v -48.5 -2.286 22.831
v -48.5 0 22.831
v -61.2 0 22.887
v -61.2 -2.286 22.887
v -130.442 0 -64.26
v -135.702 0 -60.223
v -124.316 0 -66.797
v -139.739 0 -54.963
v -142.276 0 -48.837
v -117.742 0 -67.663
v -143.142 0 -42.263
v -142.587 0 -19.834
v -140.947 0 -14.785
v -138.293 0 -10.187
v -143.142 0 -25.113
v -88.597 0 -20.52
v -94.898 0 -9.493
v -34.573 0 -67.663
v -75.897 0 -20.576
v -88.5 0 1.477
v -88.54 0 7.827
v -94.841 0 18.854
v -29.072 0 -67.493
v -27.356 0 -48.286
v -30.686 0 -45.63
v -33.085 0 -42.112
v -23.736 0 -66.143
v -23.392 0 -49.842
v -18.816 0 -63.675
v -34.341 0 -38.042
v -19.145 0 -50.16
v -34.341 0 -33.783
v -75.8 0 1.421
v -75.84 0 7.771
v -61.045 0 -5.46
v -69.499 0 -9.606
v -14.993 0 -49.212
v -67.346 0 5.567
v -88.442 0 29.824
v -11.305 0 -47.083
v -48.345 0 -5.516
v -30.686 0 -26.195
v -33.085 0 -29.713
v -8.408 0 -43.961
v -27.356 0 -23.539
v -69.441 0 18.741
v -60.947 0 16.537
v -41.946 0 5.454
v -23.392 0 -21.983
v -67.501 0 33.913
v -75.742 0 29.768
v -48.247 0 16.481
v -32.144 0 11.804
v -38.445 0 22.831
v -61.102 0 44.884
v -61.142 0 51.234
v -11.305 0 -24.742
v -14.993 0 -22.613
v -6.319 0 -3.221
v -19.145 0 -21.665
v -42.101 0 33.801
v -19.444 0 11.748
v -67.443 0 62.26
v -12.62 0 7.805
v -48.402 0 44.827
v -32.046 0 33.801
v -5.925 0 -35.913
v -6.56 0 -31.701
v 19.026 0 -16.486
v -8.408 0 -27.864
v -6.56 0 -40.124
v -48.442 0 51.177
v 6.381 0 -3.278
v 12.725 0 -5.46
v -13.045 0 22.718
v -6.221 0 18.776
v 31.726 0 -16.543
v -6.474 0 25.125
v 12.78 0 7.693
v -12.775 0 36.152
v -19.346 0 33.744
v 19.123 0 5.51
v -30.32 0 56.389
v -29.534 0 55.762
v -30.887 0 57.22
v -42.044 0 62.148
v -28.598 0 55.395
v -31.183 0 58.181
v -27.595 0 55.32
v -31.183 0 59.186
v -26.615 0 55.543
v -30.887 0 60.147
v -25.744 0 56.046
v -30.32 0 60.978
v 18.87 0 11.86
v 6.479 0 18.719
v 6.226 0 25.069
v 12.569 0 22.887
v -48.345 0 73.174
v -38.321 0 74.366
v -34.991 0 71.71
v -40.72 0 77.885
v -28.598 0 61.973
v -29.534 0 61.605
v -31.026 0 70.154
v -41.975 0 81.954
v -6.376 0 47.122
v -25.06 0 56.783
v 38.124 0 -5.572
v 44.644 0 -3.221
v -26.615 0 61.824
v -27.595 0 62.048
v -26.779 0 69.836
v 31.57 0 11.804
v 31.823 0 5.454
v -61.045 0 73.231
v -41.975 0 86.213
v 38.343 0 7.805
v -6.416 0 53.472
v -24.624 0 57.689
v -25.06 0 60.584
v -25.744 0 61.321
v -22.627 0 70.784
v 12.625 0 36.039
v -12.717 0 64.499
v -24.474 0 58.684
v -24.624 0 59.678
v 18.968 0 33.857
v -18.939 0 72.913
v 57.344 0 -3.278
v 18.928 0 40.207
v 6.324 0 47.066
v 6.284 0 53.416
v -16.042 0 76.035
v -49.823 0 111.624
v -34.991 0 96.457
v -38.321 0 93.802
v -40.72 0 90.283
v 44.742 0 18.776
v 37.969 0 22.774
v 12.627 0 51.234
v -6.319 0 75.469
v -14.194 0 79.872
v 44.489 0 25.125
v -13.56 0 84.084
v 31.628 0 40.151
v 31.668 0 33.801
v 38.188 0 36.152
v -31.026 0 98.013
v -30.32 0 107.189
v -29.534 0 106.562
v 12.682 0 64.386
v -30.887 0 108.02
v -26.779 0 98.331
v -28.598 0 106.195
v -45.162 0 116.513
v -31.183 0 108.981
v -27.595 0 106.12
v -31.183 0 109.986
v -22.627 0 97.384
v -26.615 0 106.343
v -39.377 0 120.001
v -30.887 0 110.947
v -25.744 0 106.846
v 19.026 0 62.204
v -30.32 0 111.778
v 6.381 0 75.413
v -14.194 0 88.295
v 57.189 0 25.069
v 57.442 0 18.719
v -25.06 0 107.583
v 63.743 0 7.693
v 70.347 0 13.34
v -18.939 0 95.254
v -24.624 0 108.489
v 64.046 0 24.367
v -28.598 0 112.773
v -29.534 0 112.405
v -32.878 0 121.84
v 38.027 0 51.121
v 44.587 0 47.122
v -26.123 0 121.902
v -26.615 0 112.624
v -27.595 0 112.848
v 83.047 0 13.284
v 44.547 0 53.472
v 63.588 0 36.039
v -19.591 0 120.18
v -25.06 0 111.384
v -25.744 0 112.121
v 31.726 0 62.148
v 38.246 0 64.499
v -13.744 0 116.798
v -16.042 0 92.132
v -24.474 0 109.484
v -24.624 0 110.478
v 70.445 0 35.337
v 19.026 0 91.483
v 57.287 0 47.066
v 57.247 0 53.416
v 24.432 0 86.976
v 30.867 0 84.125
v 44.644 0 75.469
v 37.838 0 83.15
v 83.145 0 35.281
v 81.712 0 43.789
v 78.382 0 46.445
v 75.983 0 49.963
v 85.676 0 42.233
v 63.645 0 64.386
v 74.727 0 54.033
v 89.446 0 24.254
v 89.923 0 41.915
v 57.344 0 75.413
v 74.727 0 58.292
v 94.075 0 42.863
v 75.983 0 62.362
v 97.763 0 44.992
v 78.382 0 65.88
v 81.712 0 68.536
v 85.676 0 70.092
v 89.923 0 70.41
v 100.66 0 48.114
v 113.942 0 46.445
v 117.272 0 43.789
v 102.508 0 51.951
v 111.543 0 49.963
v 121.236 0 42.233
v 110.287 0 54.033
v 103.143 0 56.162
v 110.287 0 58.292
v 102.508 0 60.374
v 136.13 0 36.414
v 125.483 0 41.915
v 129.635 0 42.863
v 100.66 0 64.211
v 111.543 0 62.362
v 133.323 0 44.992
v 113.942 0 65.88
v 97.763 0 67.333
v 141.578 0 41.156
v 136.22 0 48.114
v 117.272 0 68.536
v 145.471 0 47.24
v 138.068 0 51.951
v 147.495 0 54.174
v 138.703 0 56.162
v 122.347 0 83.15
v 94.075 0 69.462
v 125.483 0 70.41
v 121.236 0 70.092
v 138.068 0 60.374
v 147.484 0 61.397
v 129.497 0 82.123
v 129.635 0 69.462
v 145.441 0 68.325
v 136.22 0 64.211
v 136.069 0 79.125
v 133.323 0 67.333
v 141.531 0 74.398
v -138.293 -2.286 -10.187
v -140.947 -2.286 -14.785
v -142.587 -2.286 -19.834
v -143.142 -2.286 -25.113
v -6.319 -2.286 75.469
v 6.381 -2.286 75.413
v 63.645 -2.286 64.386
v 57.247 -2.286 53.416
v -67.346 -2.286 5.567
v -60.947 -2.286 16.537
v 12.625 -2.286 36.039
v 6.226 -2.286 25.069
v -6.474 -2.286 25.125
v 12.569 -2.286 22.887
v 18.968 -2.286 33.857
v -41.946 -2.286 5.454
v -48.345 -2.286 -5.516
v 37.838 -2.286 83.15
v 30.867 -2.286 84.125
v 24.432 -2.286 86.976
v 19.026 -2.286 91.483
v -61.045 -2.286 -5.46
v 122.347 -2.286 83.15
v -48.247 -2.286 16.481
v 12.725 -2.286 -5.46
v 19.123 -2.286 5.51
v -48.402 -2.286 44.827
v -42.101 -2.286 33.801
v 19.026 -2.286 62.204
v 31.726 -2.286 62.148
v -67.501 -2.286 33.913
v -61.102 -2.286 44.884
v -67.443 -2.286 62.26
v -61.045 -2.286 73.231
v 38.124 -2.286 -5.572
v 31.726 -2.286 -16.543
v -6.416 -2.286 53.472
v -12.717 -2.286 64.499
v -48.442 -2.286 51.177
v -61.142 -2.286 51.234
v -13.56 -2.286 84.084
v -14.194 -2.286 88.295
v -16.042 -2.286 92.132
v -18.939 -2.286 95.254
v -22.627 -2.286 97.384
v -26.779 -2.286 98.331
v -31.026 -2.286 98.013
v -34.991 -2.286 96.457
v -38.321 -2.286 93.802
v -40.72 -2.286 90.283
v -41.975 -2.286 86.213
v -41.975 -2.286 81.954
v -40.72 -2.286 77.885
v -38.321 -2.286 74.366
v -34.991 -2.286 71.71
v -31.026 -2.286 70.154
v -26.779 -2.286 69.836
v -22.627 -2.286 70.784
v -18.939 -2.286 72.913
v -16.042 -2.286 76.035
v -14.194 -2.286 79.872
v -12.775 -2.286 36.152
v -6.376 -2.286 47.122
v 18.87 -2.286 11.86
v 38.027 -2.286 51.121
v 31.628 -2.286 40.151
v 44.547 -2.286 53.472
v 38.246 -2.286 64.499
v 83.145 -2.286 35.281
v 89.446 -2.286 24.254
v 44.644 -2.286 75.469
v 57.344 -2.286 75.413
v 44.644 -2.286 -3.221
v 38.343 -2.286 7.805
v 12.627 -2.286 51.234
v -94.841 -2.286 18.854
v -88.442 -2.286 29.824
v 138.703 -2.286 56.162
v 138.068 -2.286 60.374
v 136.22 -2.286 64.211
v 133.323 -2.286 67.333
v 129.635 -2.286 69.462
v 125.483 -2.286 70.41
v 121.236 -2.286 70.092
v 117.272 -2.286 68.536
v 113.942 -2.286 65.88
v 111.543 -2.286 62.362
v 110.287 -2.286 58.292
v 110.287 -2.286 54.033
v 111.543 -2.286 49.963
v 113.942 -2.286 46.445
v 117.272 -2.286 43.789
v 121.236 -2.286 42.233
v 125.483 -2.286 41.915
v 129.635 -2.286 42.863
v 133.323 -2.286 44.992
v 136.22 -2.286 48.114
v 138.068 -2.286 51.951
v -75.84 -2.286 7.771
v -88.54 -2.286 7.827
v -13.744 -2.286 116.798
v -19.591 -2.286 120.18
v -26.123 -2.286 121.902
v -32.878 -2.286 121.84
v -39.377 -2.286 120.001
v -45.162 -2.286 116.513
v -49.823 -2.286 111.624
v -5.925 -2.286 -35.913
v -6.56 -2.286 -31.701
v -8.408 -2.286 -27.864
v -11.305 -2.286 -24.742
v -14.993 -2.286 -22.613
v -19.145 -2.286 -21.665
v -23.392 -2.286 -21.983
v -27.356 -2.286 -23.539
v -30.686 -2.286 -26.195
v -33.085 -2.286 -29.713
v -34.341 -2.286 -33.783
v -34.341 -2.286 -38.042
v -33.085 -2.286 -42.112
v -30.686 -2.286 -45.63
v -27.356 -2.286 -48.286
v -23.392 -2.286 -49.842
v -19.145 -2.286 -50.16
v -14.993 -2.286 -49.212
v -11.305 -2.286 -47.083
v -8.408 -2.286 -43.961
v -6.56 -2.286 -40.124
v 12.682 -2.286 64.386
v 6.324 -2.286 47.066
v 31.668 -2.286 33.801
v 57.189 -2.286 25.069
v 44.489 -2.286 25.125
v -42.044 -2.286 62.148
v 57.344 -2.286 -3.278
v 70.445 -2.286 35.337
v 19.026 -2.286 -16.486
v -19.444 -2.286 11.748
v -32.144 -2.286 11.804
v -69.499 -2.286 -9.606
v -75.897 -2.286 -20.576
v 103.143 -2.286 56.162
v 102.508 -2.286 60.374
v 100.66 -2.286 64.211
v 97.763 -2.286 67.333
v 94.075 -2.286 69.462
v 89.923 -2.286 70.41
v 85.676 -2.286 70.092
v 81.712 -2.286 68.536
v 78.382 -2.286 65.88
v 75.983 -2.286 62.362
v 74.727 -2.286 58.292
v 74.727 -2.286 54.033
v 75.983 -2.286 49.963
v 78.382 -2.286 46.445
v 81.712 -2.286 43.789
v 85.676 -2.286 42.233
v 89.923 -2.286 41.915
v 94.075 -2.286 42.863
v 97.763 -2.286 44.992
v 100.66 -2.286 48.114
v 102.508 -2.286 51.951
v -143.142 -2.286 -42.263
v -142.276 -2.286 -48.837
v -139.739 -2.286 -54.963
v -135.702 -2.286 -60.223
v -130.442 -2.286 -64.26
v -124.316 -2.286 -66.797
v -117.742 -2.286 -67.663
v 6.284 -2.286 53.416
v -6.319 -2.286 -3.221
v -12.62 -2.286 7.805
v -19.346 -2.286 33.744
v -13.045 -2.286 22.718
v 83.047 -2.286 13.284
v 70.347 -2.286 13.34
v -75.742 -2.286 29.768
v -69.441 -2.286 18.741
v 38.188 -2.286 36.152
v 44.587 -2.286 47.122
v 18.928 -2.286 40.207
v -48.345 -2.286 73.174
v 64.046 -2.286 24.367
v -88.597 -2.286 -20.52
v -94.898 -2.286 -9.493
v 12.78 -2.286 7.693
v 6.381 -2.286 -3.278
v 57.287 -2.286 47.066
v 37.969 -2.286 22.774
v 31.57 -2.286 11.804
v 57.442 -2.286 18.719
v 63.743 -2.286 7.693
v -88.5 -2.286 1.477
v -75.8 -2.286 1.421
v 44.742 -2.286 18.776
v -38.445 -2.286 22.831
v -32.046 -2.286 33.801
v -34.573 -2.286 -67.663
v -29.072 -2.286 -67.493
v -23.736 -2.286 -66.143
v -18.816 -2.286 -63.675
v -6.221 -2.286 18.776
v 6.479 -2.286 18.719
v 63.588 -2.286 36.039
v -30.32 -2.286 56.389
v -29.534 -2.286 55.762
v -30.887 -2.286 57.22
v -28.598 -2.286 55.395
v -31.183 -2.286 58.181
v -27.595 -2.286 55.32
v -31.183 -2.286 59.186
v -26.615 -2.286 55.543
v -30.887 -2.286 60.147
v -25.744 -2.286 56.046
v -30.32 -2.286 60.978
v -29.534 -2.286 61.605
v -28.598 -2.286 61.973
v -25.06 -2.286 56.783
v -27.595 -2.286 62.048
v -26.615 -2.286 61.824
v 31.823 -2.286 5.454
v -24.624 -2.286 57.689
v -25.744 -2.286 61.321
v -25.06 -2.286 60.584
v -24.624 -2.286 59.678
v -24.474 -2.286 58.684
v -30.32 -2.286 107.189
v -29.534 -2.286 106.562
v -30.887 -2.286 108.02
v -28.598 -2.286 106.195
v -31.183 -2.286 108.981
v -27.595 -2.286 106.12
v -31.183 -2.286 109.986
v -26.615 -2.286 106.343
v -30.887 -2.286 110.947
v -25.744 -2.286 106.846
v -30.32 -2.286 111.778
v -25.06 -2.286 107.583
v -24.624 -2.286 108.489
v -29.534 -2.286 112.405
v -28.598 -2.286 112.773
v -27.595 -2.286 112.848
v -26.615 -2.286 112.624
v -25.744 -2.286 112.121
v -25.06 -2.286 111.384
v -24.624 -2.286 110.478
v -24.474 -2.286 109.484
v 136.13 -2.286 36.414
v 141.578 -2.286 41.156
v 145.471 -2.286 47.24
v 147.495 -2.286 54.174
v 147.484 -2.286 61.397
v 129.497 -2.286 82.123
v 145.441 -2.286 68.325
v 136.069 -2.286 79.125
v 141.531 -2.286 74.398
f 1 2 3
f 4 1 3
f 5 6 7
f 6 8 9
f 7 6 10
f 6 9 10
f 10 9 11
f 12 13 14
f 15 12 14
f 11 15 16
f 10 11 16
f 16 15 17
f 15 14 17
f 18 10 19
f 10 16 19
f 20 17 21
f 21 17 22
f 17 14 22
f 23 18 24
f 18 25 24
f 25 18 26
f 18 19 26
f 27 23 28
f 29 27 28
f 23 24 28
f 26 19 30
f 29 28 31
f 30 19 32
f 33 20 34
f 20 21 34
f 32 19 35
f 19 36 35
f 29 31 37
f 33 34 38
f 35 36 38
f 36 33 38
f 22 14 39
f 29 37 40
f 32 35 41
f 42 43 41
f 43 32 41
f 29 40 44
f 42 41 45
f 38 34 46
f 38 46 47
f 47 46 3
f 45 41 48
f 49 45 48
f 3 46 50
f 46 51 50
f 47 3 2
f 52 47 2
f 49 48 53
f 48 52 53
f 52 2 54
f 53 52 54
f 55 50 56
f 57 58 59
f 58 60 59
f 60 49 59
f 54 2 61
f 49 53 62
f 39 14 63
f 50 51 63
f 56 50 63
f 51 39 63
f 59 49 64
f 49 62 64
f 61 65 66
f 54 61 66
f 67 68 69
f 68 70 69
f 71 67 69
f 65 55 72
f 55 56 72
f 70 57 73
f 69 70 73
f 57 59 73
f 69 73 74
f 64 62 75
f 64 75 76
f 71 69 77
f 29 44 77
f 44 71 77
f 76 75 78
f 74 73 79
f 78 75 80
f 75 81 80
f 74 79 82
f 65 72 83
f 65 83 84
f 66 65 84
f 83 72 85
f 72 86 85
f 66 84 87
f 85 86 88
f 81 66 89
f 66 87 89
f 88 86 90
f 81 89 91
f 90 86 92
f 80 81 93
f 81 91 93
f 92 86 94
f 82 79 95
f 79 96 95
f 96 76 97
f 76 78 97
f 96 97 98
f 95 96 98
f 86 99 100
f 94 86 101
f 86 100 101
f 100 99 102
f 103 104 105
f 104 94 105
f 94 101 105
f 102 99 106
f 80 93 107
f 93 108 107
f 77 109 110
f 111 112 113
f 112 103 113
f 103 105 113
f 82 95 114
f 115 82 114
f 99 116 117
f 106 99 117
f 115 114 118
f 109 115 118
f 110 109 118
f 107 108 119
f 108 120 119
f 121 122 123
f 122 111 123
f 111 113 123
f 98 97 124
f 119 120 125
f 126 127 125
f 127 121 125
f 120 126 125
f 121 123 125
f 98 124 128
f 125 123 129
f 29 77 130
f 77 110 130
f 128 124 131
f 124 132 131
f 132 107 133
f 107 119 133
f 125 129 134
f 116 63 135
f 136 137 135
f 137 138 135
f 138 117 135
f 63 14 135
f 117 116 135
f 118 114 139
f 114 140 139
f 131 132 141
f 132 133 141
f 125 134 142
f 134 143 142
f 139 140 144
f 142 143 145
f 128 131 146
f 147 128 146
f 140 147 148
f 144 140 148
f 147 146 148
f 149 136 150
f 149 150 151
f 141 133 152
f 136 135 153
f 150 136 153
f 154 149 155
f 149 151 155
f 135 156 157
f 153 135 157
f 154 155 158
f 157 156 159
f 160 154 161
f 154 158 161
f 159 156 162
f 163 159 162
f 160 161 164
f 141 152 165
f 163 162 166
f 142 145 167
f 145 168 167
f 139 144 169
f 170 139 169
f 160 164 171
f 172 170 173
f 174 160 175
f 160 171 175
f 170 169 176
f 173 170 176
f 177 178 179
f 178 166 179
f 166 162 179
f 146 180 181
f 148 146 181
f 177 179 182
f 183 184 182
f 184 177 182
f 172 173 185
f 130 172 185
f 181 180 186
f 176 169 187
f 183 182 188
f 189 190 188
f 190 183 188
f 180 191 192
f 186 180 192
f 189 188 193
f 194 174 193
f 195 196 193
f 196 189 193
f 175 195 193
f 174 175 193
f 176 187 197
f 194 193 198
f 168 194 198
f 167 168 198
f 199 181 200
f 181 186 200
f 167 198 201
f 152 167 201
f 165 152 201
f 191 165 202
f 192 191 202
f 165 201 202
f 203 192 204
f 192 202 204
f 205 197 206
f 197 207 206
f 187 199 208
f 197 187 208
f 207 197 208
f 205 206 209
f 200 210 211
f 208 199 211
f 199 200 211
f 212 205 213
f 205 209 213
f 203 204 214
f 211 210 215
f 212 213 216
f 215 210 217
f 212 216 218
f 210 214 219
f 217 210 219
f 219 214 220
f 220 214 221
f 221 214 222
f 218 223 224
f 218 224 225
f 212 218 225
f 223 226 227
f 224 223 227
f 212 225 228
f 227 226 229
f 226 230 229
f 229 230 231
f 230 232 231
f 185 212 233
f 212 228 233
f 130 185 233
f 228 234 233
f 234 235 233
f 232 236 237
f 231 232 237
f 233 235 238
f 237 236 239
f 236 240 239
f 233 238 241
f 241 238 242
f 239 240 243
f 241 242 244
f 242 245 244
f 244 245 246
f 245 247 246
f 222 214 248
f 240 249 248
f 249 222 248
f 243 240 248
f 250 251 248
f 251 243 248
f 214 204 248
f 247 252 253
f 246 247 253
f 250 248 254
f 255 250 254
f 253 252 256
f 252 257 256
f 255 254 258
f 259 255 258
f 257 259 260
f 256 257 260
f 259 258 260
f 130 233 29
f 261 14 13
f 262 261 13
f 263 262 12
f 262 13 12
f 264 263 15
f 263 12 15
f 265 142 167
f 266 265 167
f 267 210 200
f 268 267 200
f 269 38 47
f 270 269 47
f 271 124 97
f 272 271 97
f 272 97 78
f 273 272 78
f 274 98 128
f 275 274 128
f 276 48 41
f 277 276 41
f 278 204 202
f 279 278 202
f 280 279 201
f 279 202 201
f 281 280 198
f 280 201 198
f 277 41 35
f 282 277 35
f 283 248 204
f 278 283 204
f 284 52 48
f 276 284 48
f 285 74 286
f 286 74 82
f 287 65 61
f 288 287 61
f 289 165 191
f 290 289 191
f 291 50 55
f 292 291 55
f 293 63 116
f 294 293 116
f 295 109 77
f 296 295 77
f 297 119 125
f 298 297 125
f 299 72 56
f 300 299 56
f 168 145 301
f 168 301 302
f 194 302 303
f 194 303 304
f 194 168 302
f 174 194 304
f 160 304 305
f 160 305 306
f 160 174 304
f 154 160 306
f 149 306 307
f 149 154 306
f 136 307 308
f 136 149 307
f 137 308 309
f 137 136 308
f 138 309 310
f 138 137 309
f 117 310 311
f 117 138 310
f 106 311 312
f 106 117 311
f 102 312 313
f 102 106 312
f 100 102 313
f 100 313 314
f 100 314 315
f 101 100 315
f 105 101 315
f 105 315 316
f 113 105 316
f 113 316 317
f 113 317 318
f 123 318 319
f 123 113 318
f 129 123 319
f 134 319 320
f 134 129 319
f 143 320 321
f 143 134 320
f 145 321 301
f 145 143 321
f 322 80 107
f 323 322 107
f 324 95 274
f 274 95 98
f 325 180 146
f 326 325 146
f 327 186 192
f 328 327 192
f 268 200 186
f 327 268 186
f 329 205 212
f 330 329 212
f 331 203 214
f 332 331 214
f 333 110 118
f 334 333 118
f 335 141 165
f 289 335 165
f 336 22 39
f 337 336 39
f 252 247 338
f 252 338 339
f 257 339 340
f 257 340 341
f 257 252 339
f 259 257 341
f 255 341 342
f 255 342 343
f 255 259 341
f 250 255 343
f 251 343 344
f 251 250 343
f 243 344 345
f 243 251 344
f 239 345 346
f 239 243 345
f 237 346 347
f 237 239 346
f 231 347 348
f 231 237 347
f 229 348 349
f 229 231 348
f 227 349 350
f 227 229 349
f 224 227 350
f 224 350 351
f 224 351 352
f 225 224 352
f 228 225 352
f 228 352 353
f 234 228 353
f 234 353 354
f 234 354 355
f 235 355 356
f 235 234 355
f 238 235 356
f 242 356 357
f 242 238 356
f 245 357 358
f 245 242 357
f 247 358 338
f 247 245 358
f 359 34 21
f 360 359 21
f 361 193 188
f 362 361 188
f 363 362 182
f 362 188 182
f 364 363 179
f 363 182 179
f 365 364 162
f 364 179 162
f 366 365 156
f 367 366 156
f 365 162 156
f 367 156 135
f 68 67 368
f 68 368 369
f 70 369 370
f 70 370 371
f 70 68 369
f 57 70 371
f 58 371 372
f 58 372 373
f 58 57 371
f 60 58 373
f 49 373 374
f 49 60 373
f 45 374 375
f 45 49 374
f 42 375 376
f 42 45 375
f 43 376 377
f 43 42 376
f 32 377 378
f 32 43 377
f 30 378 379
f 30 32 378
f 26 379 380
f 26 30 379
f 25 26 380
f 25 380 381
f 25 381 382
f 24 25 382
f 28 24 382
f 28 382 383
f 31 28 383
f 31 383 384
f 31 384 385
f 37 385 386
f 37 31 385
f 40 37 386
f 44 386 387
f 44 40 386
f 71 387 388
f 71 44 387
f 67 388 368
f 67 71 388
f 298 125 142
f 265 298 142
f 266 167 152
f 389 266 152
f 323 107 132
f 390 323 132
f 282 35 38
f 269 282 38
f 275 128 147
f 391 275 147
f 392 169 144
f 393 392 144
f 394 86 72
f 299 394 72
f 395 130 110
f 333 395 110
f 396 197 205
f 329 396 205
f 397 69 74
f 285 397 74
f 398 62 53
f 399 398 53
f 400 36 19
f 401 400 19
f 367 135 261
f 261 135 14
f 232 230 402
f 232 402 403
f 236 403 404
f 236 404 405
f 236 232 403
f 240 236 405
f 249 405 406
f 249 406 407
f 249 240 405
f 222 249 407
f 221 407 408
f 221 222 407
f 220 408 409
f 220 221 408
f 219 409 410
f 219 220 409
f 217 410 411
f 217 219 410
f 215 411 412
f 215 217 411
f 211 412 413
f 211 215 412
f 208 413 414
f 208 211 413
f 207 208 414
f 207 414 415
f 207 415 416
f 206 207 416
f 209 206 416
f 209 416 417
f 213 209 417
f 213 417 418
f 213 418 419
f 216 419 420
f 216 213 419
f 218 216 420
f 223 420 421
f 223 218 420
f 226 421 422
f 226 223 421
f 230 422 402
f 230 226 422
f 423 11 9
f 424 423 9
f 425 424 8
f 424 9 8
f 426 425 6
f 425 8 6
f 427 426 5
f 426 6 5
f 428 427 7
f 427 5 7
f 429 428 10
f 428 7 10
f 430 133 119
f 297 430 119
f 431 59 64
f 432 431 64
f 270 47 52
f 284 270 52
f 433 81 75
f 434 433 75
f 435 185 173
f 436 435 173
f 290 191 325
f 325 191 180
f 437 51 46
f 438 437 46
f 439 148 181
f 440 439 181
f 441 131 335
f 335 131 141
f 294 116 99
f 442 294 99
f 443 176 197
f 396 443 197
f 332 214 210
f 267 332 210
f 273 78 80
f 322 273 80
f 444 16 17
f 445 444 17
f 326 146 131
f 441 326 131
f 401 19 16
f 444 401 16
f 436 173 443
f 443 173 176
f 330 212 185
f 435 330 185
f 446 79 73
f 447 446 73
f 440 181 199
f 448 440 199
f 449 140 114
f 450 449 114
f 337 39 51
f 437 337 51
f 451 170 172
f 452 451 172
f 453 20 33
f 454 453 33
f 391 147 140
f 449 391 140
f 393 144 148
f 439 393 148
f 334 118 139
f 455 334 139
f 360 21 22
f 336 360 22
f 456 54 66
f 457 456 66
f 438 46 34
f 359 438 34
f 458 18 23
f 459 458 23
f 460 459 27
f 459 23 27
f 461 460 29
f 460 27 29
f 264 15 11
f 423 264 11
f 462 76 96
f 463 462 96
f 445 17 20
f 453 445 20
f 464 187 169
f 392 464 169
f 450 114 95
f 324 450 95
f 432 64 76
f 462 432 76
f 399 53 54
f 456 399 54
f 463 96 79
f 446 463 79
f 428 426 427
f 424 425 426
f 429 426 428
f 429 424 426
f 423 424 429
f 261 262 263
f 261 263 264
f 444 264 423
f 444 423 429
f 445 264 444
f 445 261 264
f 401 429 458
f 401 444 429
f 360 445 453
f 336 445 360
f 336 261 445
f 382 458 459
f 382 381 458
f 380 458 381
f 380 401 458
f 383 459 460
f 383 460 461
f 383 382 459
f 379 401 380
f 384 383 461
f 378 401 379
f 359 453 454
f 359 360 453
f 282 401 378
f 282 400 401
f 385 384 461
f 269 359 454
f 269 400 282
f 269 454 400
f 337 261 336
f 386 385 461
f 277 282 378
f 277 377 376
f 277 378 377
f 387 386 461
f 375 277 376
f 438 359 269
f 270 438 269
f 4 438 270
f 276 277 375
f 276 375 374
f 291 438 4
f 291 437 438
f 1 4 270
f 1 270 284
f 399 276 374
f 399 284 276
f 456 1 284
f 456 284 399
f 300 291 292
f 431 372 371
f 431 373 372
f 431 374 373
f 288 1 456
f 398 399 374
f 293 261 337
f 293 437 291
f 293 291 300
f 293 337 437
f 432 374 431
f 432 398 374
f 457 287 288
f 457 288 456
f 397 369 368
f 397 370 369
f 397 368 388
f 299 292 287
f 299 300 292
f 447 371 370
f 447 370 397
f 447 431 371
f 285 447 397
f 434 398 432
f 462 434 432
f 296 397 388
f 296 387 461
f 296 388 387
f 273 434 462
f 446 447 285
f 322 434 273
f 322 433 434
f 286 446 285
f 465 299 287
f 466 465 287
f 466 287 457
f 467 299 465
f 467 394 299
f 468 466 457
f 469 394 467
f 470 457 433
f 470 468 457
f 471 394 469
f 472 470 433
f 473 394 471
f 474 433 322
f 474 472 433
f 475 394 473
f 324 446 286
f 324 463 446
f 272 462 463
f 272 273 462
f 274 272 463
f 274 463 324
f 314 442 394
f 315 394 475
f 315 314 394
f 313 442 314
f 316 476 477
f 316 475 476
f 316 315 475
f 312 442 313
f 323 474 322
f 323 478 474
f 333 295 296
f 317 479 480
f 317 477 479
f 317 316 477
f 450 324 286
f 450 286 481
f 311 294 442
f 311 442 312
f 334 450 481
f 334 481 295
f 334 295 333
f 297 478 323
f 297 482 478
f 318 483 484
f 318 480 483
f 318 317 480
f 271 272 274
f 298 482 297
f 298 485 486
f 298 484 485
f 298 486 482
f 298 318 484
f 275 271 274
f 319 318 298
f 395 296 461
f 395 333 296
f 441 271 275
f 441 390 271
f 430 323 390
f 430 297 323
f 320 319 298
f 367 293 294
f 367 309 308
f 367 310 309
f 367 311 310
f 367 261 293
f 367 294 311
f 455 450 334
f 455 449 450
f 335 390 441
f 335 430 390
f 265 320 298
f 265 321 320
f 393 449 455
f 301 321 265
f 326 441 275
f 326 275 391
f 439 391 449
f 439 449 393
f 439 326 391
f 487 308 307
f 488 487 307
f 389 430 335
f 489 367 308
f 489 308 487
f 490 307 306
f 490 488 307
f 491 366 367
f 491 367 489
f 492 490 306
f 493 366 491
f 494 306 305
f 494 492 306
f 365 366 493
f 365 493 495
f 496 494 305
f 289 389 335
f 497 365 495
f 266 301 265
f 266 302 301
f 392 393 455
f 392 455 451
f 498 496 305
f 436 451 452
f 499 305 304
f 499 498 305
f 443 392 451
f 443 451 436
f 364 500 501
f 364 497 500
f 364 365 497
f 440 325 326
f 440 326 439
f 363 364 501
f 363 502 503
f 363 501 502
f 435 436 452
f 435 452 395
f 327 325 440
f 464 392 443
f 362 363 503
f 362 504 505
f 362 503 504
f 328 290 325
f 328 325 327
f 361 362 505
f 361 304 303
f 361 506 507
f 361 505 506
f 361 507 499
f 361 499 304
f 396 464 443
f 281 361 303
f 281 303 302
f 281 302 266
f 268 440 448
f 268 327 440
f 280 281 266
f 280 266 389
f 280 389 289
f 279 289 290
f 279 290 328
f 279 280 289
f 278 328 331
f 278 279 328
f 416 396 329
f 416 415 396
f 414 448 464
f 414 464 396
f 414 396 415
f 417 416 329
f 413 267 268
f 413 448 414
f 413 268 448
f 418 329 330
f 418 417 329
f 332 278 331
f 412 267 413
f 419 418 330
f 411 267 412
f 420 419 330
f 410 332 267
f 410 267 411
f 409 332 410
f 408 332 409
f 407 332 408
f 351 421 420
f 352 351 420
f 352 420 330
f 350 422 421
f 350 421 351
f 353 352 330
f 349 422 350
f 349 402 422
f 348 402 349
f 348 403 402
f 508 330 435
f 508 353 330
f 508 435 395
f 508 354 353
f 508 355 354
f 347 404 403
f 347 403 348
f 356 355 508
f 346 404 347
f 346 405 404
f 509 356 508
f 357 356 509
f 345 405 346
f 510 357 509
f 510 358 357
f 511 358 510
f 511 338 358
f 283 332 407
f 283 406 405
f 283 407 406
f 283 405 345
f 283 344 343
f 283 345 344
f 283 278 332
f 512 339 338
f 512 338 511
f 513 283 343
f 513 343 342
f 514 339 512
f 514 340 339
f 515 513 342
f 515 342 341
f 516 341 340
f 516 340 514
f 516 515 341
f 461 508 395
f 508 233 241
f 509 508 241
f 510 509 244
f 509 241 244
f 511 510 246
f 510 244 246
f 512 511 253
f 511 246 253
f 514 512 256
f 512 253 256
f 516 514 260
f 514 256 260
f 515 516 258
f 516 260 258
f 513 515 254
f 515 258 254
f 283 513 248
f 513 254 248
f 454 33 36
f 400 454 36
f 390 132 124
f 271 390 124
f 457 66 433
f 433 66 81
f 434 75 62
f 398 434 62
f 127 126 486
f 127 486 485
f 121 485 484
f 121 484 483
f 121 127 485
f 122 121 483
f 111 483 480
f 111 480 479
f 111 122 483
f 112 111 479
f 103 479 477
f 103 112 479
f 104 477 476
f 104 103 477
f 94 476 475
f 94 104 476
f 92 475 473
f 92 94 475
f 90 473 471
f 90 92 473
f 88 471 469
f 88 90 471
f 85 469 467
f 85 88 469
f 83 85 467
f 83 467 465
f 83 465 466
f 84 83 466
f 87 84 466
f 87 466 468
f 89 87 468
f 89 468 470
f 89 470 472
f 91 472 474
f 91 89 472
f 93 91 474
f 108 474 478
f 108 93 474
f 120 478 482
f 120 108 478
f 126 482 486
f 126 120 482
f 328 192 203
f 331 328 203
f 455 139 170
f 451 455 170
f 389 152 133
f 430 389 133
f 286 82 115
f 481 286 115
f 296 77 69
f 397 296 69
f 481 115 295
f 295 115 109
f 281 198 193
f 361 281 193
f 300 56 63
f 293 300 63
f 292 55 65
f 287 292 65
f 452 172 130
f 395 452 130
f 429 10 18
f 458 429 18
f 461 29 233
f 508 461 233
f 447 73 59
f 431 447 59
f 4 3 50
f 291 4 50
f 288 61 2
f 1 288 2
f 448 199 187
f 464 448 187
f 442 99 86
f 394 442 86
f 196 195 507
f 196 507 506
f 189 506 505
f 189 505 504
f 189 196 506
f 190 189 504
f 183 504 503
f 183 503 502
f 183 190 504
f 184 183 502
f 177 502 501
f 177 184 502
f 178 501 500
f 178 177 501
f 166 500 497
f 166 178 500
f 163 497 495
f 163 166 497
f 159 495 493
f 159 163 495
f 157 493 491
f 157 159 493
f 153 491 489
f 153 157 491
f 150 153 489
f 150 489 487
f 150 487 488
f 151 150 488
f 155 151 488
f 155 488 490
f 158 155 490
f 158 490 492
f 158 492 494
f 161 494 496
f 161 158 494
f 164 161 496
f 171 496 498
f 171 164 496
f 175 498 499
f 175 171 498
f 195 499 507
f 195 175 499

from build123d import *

# Parameters (mm, degrees)
F0_R     = 14.2875
F0_R_2   = 3.373438
F1_DEPTH = 2.286


with BuildPart() as f1:
    # F0 (on Front) → F1 (new body)
    with BuildSketch(Plane.XZ):
        with BuildLine():
            ThreePointArc((-34.573266, -67.66252), (-26.367008, -66.963304), (-18.815872, -63.675156))
            Line((-18.815872, -63.675156), (136.129614, 36.414264))
            ThreePointArc((136.129614, 36.414264), (146.710231, 64.934436), (122.34748, 83.14998))
            Line((122.34748, 83.14998), (37.837742, 83.14998))
            ThreePointArc((37.837742, 83.14998), (27.550148, 85.3266), (19.025718, 91.483412))
            Line((19.025718, 91.483412), (-13.74376, 116.798291))
            ThreePointArc((-13.74376, 116.798291), (-32.877689, 121.840327), (-49.823331, 111.623939))
            Line((-49.823331, 111.623939), (-138.293377, -10.186806))
            ThreePointArc((-138.293377, -10.186806), (-141.899369, -17.266125), (-143.141887, -25.113168))
            Line((-143.141887, -25.113168), (-143.141887, -42.26252))
            ThreePointArc((-143.141887, -42.26252), (-135.7024, -60.223032), (-117.741887, -67.66252))
            Line((-117.741887, -67.66252), (-34.573266, -67.66252))
        make_face()
        with Locations((-20.212744, -35.91252)):
            Circle(F0_R, mode=Mode.SUBTRACT)
        Polygon((-75.897325, -20.576264), (-88.5972, -20.519901), (-94.898326, -9.493306), (-88.499577, 1.476927), (-75.799702, 1.420565), (-69.498576, -9.606031), align=None, mode=Mode.SUBTRACT)
        Polygon((-75.839717, 7.770723), (-88.539592, 7.827085), (-94.840718, 18.853681), (-88.441969, 29.823914), (-75.742094, 29.767551), (-69.440968, 18.740956), align=None, mode=Mode.SUBTRACT)
        Polygon((-48.344767, -5.516115), (-61.044642, -5.459752), (-67.345768, 5.566844), (-60.947019, 16.537077), (-48.247144, 16.480714), (-41.946018, 5.454118), align=None, mode=Mode.SUBTRACT)
        Polygon((6.38129, -3.277528), (-6.318585, -3.221165), (-12.619711, 7.80543), (-6.220962, 18.775663), (6.478913, 18.719301), (12.780039, 7.692705), align=None, mode=Mode.SUBTRACT)
        Polygon((-19.443963, 11.747547), (-32.143838, 11.80391), (-38.444964, 22.830506), (-32.046215, 33.800739), (-19.34634, 33.744376), (-13.045214, 22.71778), align=None, mode=Mode.SUBTRACT)
        Polygon((31.725593, -16.542709), (19.025718, -16.486347), (12.724592, -5.459751), (19.123341, 5.510482), (31.823216, 5.454119), (38.124342, -5.572476), align=None, mode=Mode.SUBTRACT)
        Polygon((31.570362, 11.803911), (18.870487, 11.860274), (12.569361, 22.886869), (18.96811, 33.857102), (31.667985, 33.80074), (37.969111, 22.774144), align=None, mode=Mode.SUBTRACT)
        Polygon((57.344158, -3.27753), (44.644283, -3.221167), (38.343157, 7.805429), (44.741906, 18.775662), (57.441781, 18.719299), (63.742907, 7.692703), align=None, mode=Mode.SUBTRACT)
        Polygon((83.04678, 13.283836), (70.346906, 13.340383), (64.04594, 24.367071), (70.444848, 35.337211), (83.144723, 35.280663), (89.445688, 24.253976), align=None, mode=Mode.SUBTRACT)
        Polygon((-48.499998, 22.830506), (-61.199873, 22.886868), (-67.500999, 33.913464), (-61.10225, 44.883697), (-48.402375, 44.827334), (-42.101249, 33.800739), align=None, mode=Mode.SUBTRACT)
        Polygon((6.226059, 25.069092), (-6.473816, 25.125455), (-12.774942, 36.152051), (-6.376193, 47.122284), (6.323682, 47.065921), (12.624808, 36.039325), align=None, mode=Mode.SUBTRACT)
        Polygon((-48.44239, 51.177492), (-61.142265, 51.233855), (-67.443391, 62.260451), (-61.044642, 73.230684), (-48.344767, 73.174321), (-42.043641, 62.147725), align=None, mode=Mode.SUBTRACT)
        with Locations((-27.847204, 58.683684)):
            Circle(F0_R_2, mode=Mode.SUBTRACT)
        Polygon((6.283667, 53.416079), (-6.416208, 53.472442), (-12.717334, 64.499037), (-6.318585, 75.46927), (6.38129, 75.412908), (12.682416, 64.386312), align=None, mode=Mode.SUBTRACT)
        with Locations((-27.847204, 84.083684)):
            Circle(F0_R, mode=Mode.SUBTRACT)
        with Locations((-27.847204, 109.483684)):
            Circle(F0_R_2, mode=Mode.SUBTRACT)
        Polygon((57.188926, 25.06909), (44.489052, 25.125453), (38.187926, 36.152049), (44.586675, 47.122282), (57.28655, 47.065919), (63.587675, 36.039323), align=None, mode=Mode.SUBTRACT)
        Polygon((31.62797, 40.150898), (18.928095, 40.20726), (12.626969, 51.233856), (19.025718, 62.204089), (31.725593, 62.147726), (38.026719, 51.121131), align=None, mode=Mode.SUBTRACT)
        Polygon((57.246534, 53.416077), (44.54666, 53.47244), (38.245534, 64.499036), (44.644283, 75.469269), (57.344158, 75.412906), (63.645284, 64.38631), align=None, mode=Mode.SUBTRACT)
        with Locations((88.855389, 56.16248)):
            Circle(F0_R, mode=Mode.SUBTRACT)
        with Locations((124.415389, 56.16248)):
            Circle(F0_R, mode=Mode.SUBTRACT)
    extrude(amount=F1_DEPTH)


solid = f1.part
